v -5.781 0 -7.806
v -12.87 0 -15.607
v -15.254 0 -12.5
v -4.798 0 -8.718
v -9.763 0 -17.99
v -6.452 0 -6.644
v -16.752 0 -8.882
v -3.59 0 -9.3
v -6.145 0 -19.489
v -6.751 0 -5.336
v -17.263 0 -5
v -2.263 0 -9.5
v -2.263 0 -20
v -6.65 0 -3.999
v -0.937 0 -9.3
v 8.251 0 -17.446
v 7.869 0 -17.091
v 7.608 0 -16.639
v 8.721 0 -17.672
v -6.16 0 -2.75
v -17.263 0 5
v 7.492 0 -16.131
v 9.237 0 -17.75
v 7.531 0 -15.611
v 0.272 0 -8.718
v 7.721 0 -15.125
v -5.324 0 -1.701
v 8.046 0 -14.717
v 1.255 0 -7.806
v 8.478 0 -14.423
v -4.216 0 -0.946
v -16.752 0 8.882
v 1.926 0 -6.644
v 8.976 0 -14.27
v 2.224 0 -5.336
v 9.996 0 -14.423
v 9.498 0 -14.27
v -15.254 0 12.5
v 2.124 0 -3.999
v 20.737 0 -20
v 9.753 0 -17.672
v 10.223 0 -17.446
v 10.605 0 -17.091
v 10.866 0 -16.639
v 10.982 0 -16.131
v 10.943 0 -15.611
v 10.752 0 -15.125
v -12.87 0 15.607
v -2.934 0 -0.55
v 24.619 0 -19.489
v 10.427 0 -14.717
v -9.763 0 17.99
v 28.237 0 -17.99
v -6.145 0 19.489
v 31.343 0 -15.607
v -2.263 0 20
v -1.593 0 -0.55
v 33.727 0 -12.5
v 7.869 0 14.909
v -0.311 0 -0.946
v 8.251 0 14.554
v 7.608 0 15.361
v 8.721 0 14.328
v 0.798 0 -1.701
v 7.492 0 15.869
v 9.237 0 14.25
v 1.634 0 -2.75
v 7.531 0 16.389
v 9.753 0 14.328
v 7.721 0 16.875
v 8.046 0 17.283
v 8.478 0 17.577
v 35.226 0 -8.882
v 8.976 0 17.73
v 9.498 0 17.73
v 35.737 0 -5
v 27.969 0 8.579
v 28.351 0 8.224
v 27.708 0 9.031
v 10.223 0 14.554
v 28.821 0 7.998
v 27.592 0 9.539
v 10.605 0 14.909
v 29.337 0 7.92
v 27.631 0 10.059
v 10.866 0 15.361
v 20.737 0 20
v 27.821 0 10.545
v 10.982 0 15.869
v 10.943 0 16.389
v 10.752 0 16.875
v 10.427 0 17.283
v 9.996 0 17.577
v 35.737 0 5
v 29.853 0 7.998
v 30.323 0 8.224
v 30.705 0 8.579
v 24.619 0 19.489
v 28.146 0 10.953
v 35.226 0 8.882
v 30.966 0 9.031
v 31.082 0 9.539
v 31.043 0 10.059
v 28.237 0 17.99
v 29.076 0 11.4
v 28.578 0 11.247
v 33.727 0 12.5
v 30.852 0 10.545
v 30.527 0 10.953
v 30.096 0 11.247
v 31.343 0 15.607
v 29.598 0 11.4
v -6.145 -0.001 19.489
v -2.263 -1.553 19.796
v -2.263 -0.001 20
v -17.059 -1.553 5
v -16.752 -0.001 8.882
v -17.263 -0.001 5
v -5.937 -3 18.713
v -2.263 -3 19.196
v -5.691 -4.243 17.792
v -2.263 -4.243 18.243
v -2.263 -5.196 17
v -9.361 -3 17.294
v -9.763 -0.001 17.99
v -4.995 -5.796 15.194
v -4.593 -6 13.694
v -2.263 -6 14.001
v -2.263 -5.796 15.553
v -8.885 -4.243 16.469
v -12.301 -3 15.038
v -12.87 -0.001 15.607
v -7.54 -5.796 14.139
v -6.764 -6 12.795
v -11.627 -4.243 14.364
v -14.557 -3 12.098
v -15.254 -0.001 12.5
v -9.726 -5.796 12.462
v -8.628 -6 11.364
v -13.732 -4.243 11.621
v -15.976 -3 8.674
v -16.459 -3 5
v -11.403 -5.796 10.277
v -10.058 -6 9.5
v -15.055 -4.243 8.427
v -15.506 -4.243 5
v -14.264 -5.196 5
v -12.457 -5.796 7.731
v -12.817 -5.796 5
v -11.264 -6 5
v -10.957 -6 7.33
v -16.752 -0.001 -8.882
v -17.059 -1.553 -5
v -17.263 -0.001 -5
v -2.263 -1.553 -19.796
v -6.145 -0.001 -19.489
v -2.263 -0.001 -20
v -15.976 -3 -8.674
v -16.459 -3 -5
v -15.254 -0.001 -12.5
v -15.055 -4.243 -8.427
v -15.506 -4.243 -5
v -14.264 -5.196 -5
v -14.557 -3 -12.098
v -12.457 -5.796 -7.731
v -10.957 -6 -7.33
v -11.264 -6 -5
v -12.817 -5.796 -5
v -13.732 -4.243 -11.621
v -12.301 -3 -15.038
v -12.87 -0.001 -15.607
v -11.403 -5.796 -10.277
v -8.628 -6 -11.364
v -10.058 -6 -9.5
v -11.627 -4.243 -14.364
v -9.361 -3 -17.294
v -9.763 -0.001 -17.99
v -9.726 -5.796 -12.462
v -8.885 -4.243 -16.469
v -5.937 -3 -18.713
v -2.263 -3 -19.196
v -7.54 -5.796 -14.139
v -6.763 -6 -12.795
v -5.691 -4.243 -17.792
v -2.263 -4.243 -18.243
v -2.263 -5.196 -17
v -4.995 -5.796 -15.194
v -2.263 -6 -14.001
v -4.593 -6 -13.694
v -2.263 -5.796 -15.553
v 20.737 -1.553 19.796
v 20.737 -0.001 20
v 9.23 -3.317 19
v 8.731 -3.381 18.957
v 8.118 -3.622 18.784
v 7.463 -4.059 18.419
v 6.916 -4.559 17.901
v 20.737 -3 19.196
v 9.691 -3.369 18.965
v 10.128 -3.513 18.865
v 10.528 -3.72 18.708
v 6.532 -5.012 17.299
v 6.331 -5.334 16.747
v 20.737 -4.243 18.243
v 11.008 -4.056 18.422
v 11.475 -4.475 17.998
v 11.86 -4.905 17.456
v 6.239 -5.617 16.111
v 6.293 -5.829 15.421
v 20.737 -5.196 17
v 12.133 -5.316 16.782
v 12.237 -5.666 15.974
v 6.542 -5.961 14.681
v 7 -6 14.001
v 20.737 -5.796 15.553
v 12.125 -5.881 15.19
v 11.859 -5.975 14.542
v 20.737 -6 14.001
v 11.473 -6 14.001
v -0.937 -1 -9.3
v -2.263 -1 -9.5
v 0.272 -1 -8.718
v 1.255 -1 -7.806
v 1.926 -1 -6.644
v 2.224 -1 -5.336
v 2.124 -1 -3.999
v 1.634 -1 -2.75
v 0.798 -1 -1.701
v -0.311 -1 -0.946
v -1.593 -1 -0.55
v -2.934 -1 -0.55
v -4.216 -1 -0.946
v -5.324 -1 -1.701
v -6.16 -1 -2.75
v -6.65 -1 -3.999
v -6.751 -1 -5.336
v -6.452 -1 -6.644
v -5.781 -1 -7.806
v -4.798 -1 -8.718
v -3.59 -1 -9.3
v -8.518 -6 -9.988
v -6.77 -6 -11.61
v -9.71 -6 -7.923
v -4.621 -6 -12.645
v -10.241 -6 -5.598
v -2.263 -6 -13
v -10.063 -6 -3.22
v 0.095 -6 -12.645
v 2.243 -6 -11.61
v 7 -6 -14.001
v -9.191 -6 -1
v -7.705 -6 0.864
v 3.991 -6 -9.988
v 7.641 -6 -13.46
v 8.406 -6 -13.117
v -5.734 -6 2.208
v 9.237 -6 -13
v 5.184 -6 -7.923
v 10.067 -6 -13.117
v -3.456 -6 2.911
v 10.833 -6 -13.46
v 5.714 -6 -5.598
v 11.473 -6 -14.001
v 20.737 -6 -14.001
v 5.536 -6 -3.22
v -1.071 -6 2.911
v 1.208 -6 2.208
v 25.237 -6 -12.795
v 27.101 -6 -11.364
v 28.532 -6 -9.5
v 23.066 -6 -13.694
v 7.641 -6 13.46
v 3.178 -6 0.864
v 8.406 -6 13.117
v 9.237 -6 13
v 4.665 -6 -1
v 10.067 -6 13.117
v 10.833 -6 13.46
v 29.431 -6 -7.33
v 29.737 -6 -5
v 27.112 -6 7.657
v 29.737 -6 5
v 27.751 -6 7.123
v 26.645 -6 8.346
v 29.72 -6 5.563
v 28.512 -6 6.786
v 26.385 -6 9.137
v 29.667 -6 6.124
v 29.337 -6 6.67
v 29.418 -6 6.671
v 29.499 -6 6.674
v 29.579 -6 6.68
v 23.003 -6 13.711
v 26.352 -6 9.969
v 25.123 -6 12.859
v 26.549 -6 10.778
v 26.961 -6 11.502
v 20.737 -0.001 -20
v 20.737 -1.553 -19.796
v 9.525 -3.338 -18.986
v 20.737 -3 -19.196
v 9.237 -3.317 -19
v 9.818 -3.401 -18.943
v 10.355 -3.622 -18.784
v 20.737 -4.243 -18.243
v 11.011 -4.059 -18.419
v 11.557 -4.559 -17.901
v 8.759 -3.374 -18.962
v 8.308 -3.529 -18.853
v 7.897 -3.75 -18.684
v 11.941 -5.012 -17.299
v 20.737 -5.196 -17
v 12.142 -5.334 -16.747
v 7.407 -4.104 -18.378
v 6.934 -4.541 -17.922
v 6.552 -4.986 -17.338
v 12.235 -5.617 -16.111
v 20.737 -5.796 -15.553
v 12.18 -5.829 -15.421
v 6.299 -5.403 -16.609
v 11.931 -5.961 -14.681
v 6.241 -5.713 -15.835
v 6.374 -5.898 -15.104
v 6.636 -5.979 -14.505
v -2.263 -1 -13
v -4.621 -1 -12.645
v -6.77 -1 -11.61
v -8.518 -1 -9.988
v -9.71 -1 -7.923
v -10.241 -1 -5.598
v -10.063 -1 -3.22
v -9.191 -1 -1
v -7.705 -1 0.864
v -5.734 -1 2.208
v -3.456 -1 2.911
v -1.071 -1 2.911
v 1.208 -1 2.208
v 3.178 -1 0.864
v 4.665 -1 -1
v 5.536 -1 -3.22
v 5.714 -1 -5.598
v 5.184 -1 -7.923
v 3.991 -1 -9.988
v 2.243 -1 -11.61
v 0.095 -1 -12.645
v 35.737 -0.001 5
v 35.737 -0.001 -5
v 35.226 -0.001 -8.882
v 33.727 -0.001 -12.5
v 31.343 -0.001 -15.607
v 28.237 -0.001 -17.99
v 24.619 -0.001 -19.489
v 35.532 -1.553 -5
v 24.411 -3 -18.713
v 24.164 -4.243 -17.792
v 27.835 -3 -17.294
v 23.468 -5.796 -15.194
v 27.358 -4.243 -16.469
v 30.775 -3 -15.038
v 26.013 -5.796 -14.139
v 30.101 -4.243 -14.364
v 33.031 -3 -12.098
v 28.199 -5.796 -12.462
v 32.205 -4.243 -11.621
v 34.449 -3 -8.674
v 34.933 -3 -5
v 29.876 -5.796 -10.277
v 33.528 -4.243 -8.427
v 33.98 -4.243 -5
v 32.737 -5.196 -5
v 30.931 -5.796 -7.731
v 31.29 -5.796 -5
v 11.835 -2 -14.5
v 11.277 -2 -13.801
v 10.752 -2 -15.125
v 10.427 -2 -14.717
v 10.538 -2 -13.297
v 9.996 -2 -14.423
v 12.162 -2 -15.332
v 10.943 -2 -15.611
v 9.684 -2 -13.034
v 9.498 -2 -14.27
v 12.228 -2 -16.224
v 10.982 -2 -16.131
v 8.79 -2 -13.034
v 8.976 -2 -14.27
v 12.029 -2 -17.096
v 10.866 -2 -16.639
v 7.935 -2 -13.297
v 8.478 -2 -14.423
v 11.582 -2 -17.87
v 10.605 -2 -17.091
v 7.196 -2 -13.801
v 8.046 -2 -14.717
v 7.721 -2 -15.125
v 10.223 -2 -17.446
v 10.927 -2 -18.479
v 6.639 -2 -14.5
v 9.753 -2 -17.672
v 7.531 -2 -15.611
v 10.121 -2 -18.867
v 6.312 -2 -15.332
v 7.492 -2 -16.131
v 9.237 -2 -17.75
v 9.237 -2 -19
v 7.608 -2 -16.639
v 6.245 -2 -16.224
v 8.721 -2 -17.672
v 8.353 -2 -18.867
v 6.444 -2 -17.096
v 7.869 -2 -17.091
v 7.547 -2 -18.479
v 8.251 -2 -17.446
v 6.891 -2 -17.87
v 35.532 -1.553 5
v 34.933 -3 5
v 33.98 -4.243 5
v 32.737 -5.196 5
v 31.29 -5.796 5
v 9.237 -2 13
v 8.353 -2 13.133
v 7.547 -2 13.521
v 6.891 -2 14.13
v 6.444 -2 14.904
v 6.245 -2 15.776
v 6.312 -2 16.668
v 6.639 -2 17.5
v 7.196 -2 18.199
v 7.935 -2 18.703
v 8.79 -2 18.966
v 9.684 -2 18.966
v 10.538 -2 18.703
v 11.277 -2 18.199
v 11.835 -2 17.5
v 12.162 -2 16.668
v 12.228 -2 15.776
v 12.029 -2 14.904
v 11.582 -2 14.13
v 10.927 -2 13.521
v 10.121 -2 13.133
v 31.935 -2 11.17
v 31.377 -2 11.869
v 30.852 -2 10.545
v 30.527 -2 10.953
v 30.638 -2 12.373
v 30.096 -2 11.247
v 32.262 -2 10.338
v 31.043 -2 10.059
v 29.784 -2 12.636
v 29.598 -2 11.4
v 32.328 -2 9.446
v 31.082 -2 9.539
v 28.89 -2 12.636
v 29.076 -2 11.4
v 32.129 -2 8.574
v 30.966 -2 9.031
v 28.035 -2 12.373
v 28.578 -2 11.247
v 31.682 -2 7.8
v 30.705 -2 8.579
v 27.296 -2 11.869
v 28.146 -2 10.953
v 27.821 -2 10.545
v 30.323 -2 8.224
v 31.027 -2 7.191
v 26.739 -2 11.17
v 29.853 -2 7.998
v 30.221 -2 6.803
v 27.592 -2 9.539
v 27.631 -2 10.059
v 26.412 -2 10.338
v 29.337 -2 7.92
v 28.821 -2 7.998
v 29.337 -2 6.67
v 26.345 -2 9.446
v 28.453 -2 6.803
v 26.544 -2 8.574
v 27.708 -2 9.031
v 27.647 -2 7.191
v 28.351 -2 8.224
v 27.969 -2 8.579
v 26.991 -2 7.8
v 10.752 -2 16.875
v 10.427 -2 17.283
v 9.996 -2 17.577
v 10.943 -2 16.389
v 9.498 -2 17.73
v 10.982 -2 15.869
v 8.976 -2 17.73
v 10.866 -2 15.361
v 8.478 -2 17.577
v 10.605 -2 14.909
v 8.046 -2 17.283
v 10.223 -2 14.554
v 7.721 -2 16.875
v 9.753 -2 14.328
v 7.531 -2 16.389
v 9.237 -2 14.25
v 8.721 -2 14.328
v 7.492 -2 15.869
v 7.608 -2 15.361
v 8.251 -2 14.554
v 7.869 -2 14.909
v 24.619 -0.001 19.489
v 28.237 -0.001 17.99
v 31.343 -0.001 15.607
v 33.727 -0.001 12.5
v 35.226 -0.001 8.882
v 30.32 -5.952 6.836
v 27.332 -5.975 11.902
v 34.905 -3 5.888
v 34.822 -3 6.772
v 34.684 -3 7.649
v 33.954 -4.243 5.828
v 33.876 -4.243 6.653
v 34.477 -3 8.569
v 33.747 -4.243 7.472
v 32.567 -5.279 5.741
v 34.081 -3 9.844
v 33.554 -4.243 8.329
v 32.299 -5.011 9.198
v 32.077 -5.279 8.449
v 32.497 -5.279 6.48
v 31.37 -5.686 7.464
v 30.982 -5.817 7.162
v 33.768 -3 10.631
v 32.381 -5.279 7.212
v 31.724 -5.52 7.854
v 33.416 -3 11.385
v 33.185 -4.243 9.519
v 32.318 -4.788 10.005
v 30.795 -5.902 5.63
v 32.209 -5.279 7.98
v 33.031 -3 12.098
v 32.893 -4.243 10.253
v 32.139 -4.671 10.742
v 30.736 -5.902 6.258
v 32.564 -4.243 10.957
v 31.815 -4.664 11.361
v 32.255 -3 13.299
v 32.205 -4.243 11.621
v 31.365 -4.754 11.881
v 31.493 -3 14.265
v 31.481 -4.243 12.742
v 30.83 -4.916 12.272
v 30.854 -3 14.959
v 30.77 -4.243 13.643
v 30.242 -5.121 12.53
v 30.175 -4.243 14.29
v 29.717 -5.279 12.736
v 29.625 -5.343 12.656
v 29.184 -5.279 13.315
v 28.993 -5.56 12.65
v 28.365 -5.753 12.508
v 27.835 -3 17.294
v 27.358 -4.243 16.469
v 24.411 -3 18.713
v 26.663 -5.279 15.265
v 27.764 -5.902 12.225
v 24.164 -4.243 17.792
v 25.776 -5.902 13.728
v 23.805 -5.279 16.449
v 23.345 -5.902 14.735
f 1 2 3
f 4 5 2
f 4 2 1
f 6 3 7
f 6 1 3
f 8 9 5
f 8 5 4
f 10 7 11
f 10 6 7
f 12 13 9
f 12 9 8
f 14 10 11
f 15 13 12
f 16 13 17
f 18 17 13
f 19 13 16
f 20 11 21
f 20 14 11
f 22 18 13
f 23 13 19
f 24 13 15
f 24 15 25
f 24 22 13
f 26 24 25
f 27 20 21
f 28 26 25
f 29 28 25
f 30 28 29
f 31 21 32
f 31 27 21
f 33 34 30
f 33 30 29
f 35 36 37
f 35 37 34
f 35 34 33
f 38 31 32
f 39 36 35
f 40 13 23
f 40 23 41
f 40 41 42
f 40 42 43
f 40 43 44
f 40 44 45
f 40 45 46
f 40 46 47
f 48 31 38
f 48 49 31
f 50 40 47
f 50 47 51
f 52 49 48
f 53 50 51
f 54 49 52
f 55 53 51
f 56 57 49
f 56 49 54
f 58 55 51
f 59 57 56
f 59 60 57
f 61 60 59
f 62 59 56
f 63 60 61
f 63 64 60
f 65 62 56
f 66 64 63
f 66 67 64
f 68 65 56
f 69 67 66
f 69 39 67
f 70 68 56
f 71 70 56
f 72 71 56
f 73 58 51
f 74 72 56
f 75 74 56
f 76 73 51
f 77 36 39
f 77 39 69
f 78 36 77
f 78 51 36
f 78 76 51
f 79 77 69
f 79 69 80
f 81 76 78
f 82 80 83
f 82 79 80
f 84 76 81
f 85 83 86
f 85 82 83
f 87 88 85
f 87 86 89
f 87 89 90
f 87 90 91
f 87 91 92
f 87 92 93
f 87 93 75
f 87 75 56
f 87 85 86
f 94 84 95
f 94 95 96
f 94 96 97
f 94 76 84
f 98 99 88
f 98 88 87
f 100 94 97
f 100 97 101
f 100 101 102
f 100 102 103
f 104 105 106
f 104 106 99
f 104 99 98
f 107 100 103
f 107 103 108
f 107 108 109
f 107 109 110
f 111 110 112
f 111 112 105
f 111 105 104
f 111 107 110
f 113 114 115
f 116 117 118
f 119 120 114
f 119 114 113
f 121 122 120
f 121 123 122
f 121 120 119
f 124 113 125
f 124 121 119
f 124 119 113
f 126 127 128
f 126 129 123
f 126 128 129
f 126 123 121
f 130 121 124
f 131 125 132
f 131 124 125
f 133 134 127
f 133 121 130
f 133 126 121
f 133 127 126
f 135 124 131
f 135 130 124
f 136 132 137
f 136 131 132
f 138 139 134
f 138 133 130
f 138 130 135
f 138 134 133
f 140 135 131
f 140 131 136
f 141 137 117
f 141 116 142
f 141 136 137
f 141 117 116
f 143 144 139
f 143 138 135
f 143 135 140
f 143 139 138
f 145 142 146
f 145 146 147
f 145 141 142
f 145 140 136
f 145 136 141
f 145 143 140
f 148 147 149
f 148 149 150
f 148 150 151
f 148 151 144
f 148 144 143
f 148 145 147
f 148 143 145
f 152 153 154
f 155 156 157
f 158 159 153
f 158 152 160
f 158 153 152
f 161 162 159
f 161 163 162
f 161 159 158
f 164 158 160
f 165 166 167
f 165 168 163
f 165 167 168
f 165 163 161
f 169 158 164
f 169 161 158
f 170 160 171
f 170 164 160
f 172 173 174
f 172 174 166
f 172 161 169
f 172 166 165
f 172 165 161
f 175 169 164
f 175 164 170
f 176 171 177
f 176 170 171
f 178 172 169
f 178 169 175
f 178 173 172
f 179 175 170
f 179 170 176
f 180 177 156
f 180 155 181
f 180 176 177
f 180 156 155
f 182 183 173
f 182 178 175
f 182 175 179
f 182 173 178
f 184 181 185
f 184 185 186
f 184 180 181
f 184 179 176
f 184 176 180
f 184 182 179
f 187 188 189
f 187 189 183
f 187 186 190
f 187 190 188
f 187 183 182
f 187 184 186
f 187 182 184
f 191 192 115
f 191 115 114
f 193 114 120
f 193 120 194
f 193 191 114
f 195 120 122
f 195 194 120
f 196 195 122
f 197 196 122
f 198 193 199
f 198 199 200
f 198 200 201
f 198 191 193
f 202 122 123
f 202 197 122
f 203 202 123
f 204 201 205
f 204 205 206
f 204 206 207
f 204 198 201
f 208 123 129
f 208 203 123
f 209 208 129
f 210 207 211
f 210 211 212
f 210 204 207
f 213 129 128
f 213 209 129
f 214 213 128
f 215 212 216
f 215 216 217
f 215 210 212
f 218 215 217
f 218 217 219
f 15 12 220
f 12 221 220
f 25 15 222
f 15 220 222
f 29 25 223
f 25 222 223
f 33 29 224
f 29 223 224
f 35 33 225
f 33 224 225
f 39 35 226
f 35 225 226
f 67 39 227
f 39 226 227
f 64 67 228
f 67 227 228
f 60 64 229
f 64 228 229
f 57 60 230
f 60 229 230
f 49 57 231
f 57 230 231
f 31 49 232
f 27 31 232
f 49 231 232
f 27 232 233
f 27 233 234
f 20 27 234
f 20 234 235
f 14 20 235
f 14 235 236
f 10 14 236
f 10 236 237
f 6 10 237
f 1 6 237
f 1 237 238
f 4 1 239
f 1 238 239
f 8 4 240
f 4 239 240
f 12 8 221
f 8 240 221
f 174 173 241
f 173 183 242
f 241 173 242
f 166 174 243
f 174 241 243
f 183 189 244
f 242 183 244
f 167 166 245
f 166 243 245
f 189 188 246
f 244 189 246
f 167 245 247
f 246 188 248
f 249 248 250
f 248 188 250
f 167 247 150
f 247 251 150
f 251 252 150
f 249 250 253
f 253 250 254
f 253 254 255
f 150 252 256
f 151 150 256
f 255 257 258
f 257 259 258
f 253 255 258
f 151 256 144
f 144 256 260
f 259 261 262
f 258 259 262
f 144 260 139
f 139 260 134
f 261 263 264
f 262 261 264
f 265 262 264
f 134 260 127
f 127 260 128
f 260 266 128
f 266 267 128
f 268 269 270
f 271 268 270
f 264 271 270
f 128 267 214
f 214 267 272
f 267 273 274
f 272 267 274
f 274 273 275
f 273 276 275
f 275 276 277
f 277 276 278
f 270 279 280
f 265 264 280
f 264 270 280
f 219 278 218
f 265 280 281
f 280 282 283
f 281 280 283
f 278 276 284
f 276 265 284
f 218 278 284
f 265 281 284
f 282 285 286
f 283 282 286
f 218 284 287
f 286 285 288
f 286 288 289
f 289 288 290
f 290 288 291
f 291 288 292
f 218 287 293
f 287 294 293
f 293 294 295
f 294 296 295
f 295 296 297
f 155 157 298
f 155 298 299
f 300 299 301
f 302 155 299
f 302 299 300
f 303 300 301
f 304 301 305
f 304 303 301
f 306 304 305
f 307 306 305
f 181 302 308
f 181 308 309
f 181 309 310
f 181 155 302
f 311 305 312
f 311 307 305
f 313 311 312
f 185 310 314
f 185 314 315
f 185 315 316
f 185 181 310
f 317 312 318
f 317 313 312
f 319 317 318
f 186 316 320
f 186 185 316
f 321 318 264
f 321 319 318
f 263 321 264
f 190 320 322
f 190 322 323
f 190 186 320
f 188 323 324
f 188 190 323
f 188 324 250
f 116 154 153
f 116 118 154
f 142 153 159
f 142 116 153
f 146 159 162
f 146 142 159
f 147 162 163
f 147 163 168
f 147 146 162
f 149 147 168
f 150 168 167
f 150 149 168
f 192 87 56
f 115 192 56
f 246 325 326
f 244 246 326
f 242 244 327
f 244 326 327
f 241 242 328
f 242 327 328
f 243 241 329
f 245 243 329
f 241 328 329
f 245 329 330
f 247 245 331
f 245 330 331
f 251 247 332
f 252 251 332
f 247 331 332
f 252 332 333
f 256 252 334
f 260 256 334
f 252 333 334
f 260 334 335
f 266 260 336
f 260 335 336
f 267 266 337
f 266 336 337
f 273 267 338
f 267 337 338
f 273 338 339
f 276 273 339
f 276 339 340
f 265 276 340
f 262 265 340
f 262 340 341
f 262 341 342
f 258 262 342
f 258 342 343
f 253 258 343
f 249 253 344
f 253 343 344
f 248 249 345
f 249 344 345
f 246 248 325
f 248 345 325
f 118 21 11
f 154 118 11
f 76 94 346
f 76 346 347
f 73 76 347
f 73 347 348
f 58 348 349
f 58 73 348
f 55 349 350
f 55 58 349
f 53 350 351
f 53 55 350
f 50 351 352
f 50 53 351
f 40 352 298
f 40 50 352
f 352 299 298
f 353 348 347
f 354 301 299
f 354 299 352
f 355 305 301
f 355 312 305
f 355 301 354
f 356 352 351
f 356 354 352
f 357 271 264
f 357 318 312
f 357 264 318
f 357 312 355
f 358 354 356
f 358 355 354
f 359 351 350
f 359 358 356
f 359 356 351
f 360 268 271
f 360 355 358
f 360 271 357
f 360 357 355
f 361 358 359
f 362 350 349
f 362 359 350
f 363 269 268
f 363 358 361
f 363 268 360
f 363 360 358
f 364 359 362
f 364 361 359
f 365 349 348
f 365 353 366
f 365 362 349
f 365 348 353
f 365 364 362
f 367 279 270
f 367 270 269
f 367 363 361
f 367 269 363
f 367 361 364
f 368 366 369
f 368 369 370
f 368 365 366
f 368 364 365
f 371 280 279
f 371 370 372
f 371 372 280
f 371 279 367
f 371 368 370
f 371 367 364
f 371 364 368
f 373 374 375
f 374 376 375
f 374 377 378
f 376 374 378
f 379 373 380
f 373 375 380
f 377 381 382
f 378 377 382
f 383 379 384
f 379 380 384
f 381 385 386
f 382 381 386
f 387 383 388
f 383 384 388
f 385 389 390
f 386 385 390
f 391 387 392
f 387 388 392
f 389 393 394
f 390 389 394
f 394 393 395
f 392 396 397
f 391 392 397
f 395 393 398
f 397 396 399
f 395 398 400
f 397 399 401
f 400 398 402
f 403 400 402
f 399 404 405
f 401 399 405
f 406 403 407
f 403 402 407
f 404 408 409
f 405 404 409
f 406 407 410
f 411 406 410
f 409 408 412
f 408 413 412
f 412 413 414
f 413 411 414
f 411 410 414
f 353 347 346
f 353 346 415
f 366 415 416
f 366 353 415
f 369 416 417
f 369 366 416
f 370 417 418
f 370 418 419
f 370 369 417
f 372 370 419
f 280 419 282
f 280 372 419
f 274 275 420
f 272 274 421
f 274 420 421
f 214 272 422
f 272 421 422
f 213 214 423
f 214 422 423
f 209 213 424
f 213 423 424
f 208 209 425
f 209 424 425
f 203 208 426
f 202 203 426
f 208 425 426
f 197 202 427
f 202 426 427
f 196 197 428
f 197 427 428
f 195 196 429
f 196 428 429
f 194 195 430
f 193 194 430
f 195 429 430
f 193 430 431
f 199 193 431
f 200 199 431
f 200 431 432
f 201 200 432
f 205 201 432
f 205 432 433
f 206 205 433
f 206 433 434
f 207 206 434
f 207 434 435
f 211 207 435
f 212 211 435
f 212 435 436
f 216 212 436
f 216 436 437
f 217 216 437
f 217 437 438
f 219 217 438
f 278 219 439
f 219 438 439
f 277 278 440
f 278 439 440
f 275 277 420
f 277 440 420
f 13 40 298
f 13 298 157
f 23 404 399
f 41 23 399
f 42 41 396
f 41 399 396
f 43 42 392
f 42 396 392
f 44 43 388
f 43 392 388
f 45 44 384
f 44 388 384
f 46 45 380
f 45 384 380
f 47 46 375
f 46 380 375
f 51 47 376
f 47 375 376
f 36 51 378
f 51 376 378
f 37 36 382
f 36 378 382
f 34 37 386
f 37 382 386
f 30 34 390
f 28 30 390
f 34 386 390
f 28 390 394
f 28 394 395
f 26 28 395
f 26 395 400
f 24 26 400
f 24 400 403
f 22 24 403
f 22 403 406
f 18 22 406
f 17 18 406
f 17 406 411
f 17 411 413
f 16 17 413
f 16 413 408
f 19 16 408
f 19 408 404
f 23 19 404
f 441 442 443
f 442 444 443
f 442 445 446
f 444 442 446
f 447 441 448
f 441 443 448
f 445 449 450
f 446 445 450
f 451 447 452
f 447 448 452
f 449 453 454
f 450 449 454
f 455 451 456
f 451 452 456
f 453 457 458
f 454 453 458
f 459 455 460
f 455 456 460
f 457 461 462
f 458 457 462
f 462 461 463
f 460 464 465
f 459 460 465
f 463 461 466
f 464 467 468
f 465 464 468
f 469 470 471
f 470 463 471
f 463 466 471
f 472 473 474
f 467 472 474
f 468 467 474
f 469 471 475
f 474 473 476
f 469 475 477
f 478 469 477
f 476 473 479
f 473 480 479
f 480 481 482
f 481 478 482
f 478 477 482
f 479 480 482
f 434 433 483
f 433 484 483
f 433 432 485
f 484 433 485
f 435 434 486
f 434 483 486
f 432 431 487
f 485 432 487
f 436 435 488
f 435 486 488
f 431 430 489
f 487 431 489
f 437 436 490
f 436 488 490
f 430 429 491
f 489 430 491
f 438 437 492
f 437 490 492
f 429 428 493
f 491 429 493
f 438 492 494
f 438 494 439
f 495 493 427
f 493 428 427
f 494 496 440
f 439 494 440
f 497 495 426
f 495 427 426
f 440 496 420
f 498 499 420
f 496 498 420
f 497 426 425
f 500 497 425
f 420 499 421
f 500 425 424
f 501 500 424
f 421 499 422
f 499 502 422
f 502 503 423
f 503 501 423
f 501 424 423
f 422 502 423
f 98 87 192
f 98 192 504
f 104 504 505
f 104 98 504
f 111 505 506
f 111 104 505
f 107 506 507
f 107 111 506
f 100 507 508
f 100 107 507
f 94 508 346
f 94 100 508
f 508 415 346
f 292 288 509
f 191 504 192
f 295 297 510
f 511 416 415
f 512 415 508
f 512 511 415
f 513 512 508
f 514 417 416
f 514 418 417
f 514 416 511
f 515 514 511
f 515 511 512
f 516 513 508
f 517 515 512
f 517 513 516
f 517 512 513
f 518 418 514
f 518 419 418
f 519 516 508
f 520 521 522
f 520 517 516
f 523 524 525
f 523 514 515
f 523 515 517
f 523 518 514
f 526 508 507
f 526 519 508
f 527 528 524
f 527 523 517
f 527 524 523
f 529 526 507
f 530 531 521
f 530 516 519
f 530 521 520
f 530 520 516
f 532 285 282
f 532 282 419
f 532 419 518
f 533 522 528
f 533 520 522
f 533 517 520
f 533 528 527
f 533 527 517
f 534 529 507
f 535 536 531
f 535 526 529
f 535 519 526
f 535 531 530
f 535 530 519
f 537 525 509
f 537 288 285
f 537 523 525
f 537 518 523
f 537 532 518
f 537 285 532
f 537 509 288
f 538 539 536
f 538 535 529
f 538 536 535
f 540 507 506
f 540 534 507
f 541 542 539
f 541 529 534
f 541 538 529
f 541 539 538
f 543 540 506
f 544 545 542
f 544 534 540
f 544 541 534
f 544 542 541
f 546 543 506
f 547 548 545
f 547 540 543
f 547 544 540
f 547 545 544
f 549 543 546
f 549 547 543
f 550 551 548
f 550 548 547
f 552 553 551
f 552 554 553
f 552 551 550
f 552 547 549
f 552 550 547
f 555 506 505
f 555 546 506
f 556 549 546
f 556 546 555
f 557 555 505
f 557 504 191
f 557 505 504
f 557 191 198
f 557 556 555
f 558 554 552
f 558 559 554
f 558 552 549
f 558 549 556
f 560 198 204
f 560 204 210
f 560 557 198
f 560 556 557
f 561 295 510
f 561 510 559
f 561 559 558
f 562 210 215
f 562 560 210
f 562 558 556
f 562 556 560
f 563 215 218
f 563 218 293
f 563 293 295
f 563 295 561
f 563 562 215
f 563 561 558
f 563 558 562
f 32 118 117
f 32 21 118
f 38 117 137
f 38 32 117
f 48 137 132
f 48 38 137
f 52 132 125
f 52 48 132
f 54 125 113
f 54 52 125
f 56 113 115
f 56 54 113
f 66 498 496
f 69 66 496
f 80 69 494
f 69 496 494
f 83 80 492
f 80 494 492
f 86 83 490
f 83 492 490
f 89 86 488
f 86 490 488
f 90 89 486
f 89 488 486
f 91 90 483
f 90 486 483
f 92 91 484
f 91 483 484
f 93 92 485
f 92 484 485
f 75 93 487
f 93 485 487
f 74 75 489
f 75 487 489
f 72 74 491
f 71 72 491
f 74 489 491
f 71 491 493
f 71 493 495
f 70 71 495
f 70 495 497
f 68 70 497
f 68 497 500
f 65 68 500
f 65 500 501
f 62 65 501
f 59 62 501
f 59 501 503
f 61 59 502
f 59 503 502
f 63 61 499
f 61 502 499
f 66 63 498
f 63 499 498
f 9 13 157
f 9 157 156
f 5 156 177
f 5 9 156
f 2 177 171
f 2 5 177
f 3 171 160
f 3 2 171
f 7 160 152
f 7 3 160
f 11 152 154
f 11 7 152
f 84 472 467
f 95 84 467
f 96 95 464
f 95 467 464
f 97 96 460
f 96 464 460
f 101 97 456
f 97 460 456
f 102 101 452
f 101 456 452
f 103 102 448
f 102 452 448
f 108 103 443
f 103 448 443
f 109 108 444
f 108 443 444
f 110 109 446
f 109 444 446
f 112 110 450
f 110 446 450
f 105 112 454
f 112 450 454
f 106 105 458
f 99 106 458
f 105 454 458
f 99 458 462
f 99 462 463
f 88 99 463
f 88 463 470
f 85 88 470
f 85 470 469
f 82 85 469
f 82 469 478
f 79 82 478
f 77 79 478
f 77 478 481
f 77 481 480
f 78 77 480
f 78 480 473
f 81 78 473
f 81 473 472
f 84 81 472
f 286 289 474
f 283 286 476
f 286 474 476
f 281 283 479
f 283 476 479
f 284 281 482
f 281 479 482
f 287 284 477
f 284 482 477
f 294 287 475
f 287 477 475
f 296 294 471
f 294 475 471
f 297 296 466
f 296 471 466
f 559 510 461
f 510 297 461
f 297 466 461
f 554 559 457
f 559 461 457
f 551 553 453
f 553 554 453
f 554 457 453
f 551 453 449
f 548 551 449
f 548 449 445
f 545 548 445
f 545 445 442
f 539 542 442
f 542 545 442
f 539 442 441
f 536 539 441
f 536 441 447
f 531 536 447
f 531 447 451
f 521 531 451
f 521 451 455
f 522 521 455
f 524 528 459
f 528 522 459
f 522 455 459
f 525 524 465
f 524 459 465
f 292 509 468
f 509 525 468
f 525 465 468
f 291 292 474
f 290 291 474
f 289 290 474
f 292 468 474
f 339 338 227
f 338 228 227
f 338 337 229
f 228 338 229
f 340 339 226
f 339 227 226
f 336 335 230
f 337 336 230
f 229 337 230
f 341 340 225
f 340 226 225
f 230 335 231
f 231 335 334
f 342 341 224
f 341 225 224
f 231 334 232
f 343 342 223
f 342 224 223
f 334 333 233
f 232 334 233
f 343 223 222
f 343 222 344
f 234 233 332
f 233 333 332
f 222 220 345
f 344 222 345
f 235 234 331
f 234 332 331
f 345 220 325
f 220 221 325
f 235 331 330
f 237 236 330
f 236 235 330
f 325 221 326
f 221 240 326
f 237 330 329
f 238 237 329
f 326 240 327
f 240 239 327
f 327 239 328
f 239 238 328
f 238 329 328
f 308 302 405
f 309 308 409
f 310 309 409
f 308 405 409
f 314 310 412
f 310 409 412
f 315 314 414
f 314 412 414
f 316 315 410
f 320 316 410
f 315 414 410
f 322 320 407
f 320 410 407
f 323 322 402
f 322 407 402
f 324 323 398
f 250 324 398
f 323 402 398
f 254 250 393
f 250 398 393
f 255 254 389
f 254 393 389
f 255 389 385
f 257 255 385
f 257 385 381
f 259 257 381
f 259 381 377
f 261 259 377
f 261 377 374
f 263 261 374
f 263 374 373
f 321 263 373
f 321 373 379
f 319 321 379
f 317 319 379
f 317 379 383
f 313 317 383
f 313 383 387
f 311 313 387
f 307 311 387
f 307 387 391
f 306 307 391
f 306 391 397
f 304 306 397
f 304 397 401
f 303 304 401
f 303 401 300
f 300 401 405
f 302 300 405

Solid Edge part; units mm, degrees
sketch "Sketch1" plane through (0, 0, 0) normal (0, -1, 0) x (1, 0, 0)
  line L0 (35.7368, 5) -> (35.7368, -5)
  line L1 (20.7368, -20) -> (-2.2632, -20)
  line L2 (-17.2632, 5) -> (-17.2632, -5)
  line L3 (20.7368, 20) -> (-2.2632, 20)
  arc A0 (35.7368, -5) -> (20.7368, -20) centre (20.7368, -5) cw
  arc A1 (-2.2632, -20) -> (-17.2632, -5) centre (-2.2632, -5) cw
  arc A2 (-17.2632, 5) -> (-2.2632, 20) centre (-2.2632, 5) cw
  arc A3 (20.7368, 20) -> (35.7368, 5) centre (20.7368, 5) cw
extrude "Protrusion1" add sketch "Sketch1" along normal blind 6
fillet "Redondeo_1" radius 6 8 edges at (31.3434, -6, 15.6066) (35.7368, -6, 0) (31.3434, -6, -15.6066) (9.2368, -6, -20) (-12.8698, -6, -15.6066) (-17.2632, -6, 0) (-12.8698, -6, 15.6066) (9.2368, -6, 20)
hole "Agujero_1" at (-2.2632, -6, -5) direction (0, 1, 0) diameter 9 end up to next counterbore diameter 16 counterbore depth 5
hole "Agujero_2" at (9.2368, -6, 16) direction (0, 1, 0) diameter 3.5 end up to next counterbore diameter 6 counterbore depth 4
hole "Hole1" at (9.2368, -6, -16) direction (0, 1, 0) diameter 3.5 end up to next counterbore diameter 6 counterbore depth 4
hole "Hole2" at (29.3368, -6, 9.67) direction (0, 1, 0) diameter 3.5 end up to next counterbore diameter 6 counterbore depth 4
